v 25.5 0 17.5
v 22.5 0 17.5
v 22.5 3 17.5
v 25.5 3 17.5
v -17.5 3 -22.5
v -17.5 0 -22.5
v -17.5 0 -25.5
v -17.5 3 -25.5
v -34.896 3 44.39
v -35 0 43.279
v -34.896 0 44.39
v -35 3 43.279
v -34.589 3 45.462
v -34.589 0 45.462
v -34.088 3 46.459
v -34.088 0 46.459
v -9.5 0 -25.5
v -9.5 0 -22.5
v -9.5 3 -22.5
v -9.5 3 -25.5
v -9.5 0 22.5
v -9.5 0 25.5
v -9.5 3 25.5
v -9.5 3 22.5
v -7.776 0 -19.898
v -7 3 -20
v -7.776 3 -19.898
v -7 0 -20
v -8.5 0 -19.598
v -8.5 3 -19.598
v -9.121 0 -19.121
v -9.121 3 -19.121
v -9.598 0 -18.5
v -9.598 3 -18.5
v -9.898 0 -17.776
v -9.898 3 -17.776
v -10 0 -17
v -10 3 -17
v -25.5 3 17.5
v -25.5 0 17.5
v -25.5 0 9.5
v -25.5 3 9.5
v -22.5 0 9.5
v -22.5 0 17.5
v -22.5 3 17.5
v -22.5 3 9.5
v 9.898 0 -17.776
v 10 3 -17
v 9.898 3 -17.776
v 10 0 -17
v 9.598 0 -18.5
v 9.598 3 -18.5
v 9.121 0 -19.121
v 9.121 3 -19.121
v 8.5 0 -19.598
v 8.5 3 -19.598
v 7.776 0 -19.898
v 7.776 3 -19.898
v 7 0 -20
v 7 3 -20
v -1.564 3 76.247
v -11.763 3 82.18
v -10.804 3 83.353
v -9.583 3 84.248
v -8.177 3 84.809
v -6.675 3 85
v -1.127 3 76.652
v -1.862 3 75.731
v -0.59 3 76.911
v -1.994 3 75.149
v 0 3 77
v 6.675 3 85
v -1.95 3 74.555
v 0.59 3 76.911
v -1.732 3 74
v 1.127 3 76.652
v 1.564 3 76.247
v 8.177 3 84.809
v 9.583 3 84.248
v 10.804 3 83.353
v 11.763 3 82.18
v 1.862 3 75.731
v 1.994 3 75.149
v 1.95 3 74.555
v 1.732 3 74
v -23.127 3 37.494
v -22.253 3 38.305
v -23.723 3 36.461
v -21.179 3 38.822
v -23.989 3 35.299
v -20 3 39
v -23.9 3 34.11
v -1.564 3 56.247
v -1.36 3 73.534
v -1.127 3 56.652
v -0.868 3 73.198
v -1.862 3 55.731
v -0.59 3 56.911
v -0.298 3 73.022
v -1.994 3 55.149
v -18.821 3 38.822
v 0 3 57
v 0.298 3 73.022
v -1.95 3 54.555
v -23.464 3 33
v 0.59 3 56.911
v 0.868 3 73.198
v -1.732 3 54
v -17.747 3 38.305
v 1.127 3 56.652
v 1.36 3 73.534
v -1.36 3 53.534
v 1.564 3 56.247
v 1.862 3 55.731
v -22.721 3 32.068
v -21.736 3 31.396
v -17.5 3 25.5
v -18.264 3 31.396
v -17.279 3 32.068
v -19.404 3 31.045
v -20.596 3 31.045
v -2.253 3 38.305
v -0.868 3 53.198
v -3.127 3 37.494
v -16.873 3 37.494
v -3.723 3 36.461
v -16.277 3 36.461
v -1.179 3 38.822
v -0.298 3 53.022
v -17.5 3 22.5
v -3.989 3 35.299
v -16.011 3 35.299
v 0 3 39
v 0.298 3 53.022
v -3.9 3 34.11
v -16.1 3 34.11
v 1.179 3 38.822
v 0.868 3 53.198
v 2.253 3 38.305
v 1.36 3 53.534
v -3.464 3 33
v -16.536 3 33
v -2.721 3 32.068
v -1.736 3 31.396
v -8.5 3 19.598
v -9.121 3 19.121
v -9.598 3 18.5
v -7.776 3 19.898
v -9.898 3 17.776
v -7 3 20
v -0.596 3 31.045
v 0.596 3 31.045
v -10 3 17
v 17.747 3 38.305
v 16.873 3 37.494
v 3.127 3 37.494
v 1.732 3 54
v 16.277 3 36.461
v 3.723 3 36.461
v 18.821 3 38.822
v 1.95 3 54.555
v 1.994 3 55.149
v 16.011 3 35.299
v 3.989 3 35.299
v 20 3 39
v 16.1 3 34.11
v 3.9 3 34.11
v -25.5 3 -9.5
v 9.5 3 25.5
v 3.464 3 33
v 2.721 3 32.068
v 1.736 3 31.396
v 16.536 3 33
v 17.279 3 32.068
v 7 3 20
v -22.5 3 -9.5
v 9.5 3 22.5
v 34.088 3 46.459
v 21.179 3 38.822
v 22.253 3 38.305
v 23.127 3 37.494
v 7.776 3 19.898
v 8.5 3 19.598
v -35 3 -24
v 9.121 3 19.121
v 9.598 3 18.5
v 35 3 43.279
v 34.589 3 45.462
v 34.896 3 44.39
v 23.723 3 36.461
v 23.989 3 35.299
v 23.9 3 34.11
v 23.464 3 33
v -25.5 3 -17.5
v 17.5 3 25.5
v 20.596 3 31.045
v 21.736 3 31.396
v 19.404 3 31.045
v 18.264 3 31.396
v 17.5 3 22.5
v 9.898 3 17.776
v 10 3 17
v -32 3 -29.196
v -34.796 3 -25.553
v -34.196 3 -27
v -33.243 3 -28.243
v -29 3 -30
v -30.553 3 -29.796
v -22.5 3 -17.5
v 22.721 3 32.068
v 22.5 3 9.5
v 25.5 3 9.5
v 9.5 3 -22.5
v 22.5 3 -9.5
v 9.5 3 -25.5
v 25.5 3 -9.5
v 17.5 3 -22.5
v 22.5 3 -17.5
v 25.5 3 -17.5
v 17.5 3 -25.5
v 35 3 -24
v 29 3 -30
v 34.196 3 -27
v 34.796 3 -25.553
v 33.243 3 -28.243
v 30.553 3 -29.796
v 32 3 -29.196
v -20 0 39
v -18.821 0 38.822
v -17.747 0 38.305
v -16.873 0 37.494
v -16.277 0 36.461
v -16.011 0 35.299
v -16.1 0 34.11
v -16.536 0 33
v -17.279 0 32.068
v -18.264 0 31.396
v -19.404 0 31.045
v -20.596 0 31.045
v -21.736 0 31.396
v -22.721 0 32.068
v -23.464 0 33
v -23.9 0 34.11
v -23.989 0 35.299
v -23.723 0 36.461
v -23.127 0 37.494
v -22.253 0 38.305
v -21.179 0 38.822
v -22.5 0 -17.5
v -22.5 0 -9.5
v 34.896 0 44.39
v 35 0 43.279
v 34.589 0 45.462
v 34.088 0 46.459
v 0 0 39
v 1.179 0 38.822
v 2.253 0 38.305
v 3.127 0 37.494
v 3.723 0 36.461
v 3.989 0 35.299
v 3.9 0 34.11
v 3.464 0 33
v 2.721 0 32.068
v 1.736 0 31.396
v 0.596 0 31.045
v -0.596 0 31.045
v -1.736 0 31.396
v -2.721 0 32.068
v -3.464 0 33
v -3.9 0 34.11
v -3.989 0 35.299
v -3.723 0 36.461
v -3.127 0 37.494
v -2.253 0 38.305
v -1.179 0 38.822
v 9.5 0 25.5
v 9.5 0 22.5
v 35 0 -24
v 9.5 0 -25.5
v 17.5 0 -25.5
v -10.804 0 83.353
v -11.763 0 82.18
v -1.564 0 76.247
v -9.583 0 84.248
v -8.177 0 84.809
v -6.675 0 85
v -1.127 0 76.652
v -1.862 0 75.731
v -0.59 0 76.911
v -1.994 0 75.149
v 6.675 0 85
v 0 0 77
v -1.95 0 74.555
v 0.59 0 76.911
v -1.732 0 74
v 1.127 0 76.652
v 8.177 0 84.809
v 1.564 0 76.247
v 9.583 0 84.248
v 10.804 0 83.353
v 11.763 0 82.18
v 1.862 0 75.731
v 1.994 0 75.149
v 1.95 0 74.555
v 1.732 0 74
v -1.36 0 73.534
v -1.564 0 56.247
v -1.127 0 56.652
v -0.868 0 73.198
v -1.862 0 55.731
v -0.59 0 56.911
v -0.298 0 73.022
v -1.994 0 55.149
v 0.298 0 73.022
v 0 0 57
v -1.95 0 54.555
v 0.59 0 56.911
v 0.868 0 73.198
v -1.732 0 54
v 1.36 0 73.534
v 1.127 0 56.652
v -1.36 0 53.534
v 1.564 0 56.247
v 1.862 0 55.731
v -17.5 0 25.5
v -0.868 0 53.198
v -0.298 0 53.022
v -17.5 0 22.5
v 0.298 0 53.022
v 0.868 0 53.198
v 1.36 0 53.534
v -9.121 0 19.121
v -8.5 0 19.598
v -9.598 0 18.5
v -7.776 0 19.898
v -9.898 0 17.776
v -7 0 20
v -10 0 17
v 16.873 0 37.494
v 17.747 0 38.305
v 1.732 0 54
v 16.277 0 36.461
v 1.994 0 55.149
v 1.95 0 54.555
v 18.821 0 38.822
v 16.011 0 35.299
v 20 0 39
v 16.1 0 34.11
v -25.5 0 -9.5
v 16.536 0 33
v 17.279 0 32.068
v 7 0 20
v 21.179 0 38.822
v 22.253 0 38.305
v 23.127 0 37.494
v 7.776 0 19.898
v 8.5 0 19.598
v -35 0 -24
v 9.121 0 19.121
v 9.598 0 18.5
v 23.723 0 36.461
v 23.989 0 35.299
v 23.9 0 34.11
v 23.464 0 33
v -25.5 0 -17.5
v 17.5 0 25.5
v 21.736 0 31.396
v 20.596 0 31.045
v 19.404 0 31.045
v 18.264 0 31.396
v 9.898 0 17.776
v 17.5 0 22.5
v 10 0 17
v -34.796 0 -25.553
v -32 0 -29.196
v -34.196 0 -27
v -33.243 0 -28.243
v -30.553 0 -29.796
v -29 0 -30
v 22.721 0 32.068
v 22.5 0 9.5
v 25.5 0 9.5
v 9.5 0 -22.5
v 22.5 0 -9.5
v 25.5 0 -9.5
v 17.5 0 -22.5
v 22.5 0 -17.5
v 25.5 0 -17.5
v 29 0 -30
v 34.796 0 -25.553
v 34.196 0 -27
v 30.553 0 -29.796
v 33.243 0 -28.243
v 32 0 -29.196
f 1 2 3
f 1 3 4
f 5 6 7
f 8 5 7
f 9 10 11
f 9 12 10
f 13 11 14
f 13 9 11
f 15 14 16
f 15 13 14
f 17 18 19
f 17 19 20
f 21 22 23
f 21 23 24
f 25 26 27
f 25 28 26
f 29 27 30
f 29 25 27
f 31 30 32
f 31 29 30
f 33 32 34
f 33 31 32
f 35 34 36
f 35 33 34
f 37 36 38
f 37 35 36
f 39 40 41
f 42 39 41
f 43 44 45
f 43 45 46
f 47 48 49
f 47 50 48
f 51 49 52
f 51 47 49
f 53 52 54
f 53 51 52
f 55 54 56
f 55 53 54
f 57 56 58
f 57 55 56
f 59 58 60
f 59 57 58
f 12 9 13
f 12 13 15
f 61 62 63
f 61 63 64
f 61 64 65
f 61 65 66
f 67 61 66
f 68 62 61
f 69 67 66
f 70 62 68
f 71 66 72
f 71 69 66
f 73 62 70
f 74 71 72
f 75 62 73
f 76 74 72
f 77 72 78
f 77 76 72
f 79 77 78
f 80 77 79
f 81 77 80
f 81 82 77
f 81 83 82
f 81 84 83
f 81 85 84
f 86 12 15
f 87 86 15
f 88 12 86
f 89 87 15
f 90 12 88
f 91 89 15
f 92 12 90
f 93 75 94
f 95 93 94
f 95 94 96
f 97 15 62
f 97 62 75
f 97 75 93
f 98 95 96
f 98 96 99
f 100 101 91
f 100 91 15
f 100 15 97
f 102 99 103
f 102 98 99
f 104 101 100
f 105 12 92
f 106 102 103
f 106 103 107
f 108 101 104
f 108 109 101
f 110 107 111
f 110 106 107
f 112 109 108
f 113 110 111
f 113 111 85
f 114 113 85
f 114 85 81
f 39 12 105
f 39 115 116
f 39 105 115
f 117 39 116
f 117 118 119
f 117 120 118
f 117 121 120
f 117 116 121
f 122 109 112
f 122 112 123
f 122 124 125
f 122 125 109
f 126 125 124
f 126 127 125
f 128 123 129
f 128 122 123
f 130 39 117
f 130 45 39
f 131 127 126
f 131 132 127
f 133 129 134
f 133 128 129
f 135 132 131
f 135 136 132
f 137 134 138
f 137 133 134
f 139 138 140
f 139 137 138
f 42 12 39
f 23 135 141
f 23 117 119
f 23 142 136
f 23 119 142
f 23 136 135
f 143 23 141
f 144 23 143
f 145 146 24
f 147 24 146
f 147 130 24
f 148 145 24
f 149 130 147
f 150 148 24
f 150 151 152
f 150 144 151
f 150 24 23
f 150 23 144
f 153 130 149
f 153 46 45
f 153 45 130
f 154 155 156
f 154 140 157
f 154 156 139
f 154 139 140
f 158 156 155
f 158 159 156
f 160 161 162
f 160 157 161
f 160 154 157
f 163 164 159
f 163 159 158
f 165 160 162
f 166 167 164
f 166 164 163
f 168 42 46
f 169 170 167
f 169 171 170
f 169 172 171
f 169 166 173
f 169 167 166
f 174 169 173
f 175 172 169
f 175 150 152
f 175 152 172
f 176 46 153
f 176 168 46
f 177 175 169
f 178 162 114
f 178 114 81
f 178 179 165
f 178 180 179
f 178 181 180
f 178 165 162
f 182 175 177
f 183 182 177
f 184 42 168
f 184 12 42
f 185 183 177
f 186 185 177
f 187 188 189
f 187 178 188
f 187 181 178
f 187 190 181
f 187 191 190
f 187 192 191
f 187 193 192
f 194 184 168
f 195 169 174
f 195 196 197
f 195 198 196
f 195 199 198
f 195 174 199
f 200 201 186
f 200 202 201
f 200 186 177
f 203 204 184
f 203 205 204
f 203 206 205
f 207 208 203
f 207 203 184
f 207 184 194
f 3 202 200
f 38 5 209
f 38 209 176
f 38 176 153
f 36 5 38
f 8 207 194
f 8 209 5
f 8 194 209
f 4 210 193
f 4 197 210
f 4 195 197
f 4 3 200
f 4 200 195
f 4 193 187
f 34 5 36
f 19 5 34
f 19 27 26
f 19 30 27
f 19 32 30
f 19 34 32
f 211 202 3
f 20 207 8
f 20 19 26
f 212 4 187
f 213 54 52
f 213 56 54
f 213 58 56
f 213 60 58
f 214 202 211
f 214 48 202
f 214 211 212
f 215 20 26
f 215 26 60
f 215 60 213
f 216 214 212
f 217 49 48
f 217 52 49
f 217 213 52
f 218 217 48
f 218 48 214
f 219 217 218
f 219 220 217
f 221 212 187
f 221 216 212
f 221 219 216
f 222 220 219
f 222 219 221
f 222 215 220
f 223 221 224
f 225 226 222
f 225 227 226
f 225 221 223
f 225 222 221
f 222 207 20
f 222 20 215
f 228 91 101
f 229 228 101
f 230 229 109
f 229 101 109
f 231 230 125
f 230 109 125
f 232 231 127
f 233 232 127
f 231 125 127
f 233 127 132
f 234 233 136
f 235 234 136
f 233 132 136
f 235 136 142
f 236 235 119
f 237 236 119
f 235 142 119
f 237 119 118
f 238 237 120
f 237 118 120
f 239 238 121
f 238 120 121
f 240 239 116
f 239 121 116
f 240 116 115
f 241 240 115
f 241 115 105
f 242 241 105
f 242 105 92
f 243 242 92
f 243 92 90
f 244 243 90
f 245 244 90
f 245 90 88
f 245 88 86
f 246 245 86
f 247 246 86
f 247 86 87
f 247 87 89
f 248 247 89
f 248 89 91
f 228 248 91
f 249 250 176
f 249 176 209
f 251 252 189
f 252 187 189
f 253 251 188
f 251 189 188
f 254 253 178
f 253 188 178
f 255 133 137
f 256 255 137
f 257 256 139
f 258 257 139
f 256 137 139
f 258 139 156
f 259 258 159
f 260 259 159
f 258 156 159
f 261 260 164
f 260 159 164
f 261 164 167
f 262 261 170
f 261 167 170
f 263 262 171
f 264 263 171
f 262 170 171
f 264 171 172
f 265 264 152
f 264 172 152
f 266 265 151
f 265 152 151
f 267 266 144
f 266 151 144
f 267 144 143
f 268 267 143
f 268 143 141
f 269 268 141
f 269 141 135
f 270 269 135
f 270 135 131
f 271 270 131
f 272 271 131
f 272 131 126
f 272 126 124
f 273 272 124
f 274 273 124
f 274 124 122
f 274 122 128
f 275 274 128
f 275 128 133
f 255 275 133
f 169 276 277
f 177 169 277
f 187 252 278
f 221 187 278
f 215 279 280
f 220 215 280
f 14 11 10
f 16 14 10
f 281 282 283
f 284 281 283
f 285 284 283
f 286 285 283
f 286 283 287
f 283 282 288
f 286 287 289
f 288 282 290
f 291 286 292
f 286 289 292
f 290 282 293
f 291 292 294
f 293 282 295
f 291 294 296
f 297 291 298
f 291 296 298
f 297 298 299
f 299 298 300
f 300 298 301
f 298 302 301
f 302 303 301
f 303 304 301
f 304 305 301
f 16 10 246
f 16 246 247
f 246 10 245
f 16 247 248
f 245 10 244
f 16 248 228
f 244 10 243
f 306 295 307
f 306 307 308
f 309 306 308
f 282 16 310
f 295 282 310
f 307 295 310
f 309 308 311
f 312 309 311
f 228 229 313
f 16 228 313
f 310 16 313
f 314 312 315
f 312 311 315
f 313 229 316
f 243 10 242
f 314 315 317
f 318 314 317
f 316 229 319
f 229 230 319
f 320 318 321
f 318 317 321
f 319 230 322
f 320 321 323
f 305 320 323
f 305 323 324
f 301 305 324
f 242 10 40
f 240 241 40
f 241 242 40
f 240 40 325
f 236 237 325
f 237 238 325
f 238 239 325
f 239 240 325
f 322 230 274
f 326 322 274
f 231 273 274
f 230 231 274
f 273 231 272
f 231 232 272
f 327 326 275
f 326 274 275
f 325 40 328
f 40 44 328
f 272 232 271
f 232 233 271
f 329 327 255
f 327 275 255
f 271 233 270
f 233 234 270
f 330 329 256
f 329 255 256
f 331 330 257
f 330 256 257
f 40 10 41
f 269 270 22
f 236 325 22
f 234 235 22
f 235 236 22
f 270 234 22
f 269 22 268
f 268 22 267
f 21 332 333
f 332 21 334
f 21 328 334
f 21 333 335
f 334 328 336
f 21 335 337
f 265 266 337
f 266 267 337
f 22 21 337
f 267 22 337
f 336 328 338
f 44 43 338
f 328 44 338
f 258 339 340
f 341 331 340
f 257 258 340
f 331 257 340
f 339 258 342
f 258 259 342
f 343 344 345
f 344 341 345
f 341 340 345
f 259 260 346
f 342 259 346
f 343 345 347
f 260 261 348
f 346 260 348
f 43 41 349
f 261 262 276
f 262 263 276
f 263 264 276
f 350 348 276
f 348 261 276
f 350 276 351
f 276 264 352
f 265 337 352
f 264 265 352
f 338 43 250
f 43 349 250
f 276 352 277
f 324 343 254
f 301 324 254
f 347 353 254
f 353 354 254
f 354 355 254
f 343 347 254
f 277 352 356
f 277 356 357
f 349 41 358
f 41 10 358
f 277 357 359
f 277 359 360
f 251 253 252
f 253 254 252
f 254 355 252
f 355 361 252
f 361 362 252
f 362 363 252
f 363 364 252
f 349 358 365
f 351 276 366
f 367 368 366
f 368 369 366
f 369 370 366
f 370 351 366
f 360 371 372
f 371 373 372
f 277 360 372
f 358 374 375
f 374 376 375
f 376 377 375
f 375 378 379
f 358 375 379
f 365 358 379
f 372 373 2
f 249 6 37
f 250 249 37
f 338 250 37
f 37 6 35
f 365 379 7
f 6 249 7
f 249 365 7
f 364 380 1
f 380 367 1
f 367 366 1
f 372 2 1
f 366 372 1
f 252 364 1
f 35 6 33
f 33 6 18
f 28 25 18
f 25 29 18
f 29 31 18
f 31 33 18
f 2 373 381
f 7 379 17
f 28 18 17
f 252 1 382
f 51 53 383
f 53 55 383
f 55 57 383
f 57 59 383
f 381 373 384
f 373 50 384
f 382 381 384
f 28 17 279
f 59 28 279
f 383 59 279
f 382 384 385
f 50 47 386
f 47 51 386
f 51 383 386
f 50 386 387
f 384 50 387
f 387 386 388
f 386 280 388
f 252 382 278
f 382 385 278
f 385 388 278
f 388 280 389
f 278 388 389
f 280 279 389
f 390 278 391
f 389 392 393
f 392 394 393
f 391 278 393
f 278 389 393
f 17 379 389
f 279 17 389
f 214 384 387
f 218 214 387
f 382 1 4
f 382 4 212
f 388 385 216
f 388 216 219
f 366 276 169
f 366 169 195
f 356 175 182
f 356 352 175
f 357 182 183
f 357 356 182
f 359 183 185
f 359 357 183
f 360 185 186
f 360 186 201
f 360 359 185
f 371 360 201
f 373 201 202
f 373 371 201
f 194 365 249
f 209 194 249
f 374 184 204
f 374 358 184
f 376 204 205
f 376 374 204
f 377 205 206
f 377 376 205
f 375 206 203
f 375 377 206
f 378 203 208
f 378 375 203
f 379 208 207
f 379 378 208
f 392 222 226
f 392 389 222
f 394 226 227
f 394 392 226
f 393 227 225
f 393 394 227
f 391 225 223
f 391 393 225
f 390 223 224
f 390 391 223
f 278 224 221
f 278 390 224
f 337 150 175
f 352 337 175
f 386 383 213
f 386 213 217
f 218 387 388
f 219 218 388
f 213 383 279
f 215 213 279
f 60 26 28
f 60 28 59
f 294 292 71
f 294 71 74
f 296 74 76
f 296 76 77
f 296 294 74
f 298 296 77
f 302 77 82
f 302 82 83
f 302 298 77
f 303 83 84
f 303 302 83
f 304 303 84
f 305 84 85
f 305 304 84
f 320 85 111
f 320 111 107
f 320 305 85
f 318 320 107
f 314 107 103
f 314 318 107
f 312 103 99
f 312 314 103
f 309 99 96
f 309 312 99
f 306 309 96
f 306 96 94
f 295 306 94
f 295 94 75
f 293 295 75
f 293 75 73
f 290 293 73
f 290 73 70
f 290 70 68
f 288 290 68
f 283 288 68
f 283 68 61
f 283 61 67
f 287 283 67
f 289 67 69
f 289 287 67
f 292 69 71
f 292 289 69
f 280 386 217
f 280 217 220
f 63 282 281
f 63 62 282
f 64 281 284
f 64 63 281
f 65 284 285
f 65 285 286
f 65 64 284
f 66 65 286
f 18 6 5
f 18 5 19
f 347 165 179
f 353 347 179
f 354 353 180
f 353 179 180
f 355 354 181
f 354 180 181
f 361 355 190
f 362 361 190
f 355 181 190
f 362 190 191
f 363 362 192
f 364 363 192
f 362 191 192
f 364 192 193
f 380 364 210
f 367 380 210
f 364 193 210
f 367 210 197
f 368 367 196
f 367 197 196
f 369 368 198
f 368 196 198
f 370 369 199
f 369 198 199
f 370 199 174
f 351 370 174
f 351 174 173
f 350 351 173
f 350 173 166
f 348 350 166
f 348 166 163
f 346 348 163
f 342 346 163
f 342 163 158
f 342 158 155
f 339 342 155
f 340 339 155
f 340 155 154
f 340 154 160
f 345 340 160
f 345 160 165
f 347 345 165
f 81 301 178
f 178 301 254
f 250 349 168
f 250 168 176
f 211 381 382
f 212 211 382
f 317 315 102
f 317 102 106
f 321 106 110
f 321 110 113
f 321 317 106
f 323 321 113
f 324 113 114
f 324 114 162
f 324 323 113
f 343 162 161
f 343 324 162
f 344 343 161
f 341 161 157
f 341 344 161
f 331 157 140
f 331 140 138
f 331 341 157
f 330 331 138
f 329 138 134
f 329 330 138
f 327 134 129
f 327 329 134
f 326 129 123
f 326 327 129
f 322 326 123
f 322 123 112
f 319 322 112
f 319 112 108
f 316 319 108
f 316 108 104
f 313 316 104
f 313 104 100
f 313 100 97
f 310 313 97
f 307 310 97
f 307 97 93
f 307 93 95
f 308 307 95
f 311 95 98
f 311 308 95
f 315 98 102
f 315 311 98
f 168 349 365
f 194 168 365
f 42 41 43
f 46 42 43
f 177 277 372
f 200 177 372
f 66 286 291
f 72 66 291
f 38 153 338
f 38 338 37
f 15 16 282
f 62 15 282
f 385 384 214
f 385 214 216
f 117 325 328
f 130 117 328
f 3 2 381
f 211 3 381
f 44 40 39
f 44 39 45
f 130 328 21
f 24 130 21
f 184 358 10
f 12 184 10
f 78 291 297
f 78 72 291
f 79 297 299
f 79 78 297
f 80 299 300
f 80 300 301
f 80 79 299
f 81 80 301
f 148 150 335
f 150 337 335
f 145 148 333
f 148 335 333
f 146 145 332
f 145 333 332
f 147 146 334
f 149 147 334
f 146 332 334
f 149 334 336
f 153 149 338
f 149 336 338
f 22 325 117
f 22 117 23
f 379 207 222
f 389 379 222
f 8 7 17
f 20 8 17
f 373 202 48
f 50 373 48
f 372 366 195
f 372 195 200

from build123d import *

# Parameters (mm, degrees)
SKETCH_1_R          = 2
SKETCH_1_W          = 3
SKETCH_1_H          = 8
SKETCH_1_W_2        = 8
SKETCH_1_H_2        = 3
EXTRUDE_1_DEPTH     = 3
SKETCH_2_R          = 4
CUT_EXTRUDE_1_DEPTH = 10
SKETCH_3_W          = 70
SKETCH_3_H          = 15
CUT_EXTRUDE_2_DEPTH = 10
SKETCH_4_W          = 20
SKETCH_4_H          = 40
CUT_EXTRUDE_3_DEPTH = 10
FILLET_1_R          = 3
FILLET_2_R          = 6


with BuildPart() as part:
    # 草图1 → 凸台-拉伸1 (new body)
    with BuildSketch(Plane(origin=(0, 0, 0), x_dir=(1, 0, 0), z_dir=(0, 1, 0))):
        Polygon((-35, -45), (-10, -85), (10, -85), (35, -45), (35, 45), (-35, 45), align=None)
        with Locations(Location((0, -55, 0), (0, 0, 270))):
            Circle(SKETCH_1_R, mode=Mode.SUBTRACT)
        with Locations(Location((0, -75, 0), (0, 0, 270))):
            Circle(SKETCH_1_R, mode=Mode.SUBTRACT)
        with Locations((-24, 13.5)):
            Rectangle(SKETCH_1_W, SKETCH_1_H, mode=Mode.SUBTRACT)
        with Locations((-24, -13.5)):
            Rectangle(SKETCH_1_W, SKETCH_1_H, mode=Mode.SUBTRACT)
        with Locations((13.5, 24)):
            Rectangle(SKETCH_1_W_2, SKETCH_1_H_2, mode=Mode.SUBTRACT)
        with Locations((-13.5, 24)):
            Rectangle(SKETCH_1_W_2, SKETCH_1_H_2, mode=Mode.SUBTRACT)
        with Locations((-13.5, -24)):
            Rectangle(SKETCH_1_W_2, SKETCH_1_H_2, mode=Mode.SUBTRACT)
        with Locations((13.5, -24)):
            Rectangle(SKETCH_1_W_2, SKETCH_1_H_2, mode=Mode.SUBTRACT)
        with Locations((24, 13.5)):
            Rectangle(SKETCH_1_W, SKETCH_1_H, mode=Mode.SUBTRACT)
        with Locations((24, -13.5)):
            Rectangle(SKETCH_1_W, SKETCH_1_H, mode=Mode.SUBTRACT)
    extrude(amount=EXTRUDE_1_DEPTH)

    # 草图2 → 切除-拉伸1 (cut)
    with BuildSketch(Plane(origin=(0, 3, 0), x_dir=(1, 0, 0), z_dir=(0, 1, 0))):
        with Locations(Location((0, -35, 0), (0, 0, 270))):
            Circle(SKETCH_2_R)
        with Locations(Location((-20, -35, 0), (0, 0, 270))):
            Circle(SKETCH_2_R)
        with Locations(Location((20, -35, 0), (0, 0, 270))):
            Circle(SKETCH_2_R)
    extrude(amount=-CUT_EXTRUDE_1_DEPTH, mode=Mode.SUBTRACT)

    # 草图3 → 切除-拉伸2 (cut)
    with BuildSketch(Plane(origin=(0, 3, 0), x_dir=(1, 0, 0), z_dir=(0, 1, 0))):
        with Locations((0, 37.5)):
            Rectangle(SKETCH_3_W, SKETCH_3_H)
    extrude(amount=-CUT_EXTRUDE_2_DEPTH, mode=Mode.SUBTRACT)

    # 草图4 → 切除-拉伸3 (cut)
    with BuildSketch(Plane(origin=(0, 3, 0), x_dir=(1, 0, 0), z_dir=(0, 1, 0))):
        Rectangle(SKETCH_4_W, SKETCH_4_H)
    extrude(amount=-CUT_EXTRUDE_3_DEPTH, mode=Mode.SUBTRACT)

    # 圆角1
    fillet_1_edges = [part.edges().sort_by_distance(p)[0] for p in [
        (10, 1.5, -20),
        (10, 1.5, 20),
        (-10, 1.5, 20),
        (-10, 1.5, -20),
    ]]
    fillet(fillet_1_edges, radius=FILLET_1_R)

    # 圆角2
    fillet_2_edges = [part.edges().sort_by_distance(p)[0] for p in [
        (-35, 1.5, -30),
        (35, 1.5, -30),
        (-10, 1.5, 85),
        (-35, 1.5, 45),
        (35, 1.5, 45),
        (10, 1.5, 85),
    ]]
    fillet(fillet_2_edges, radius=FILLET_2_R)


solid = part.part
